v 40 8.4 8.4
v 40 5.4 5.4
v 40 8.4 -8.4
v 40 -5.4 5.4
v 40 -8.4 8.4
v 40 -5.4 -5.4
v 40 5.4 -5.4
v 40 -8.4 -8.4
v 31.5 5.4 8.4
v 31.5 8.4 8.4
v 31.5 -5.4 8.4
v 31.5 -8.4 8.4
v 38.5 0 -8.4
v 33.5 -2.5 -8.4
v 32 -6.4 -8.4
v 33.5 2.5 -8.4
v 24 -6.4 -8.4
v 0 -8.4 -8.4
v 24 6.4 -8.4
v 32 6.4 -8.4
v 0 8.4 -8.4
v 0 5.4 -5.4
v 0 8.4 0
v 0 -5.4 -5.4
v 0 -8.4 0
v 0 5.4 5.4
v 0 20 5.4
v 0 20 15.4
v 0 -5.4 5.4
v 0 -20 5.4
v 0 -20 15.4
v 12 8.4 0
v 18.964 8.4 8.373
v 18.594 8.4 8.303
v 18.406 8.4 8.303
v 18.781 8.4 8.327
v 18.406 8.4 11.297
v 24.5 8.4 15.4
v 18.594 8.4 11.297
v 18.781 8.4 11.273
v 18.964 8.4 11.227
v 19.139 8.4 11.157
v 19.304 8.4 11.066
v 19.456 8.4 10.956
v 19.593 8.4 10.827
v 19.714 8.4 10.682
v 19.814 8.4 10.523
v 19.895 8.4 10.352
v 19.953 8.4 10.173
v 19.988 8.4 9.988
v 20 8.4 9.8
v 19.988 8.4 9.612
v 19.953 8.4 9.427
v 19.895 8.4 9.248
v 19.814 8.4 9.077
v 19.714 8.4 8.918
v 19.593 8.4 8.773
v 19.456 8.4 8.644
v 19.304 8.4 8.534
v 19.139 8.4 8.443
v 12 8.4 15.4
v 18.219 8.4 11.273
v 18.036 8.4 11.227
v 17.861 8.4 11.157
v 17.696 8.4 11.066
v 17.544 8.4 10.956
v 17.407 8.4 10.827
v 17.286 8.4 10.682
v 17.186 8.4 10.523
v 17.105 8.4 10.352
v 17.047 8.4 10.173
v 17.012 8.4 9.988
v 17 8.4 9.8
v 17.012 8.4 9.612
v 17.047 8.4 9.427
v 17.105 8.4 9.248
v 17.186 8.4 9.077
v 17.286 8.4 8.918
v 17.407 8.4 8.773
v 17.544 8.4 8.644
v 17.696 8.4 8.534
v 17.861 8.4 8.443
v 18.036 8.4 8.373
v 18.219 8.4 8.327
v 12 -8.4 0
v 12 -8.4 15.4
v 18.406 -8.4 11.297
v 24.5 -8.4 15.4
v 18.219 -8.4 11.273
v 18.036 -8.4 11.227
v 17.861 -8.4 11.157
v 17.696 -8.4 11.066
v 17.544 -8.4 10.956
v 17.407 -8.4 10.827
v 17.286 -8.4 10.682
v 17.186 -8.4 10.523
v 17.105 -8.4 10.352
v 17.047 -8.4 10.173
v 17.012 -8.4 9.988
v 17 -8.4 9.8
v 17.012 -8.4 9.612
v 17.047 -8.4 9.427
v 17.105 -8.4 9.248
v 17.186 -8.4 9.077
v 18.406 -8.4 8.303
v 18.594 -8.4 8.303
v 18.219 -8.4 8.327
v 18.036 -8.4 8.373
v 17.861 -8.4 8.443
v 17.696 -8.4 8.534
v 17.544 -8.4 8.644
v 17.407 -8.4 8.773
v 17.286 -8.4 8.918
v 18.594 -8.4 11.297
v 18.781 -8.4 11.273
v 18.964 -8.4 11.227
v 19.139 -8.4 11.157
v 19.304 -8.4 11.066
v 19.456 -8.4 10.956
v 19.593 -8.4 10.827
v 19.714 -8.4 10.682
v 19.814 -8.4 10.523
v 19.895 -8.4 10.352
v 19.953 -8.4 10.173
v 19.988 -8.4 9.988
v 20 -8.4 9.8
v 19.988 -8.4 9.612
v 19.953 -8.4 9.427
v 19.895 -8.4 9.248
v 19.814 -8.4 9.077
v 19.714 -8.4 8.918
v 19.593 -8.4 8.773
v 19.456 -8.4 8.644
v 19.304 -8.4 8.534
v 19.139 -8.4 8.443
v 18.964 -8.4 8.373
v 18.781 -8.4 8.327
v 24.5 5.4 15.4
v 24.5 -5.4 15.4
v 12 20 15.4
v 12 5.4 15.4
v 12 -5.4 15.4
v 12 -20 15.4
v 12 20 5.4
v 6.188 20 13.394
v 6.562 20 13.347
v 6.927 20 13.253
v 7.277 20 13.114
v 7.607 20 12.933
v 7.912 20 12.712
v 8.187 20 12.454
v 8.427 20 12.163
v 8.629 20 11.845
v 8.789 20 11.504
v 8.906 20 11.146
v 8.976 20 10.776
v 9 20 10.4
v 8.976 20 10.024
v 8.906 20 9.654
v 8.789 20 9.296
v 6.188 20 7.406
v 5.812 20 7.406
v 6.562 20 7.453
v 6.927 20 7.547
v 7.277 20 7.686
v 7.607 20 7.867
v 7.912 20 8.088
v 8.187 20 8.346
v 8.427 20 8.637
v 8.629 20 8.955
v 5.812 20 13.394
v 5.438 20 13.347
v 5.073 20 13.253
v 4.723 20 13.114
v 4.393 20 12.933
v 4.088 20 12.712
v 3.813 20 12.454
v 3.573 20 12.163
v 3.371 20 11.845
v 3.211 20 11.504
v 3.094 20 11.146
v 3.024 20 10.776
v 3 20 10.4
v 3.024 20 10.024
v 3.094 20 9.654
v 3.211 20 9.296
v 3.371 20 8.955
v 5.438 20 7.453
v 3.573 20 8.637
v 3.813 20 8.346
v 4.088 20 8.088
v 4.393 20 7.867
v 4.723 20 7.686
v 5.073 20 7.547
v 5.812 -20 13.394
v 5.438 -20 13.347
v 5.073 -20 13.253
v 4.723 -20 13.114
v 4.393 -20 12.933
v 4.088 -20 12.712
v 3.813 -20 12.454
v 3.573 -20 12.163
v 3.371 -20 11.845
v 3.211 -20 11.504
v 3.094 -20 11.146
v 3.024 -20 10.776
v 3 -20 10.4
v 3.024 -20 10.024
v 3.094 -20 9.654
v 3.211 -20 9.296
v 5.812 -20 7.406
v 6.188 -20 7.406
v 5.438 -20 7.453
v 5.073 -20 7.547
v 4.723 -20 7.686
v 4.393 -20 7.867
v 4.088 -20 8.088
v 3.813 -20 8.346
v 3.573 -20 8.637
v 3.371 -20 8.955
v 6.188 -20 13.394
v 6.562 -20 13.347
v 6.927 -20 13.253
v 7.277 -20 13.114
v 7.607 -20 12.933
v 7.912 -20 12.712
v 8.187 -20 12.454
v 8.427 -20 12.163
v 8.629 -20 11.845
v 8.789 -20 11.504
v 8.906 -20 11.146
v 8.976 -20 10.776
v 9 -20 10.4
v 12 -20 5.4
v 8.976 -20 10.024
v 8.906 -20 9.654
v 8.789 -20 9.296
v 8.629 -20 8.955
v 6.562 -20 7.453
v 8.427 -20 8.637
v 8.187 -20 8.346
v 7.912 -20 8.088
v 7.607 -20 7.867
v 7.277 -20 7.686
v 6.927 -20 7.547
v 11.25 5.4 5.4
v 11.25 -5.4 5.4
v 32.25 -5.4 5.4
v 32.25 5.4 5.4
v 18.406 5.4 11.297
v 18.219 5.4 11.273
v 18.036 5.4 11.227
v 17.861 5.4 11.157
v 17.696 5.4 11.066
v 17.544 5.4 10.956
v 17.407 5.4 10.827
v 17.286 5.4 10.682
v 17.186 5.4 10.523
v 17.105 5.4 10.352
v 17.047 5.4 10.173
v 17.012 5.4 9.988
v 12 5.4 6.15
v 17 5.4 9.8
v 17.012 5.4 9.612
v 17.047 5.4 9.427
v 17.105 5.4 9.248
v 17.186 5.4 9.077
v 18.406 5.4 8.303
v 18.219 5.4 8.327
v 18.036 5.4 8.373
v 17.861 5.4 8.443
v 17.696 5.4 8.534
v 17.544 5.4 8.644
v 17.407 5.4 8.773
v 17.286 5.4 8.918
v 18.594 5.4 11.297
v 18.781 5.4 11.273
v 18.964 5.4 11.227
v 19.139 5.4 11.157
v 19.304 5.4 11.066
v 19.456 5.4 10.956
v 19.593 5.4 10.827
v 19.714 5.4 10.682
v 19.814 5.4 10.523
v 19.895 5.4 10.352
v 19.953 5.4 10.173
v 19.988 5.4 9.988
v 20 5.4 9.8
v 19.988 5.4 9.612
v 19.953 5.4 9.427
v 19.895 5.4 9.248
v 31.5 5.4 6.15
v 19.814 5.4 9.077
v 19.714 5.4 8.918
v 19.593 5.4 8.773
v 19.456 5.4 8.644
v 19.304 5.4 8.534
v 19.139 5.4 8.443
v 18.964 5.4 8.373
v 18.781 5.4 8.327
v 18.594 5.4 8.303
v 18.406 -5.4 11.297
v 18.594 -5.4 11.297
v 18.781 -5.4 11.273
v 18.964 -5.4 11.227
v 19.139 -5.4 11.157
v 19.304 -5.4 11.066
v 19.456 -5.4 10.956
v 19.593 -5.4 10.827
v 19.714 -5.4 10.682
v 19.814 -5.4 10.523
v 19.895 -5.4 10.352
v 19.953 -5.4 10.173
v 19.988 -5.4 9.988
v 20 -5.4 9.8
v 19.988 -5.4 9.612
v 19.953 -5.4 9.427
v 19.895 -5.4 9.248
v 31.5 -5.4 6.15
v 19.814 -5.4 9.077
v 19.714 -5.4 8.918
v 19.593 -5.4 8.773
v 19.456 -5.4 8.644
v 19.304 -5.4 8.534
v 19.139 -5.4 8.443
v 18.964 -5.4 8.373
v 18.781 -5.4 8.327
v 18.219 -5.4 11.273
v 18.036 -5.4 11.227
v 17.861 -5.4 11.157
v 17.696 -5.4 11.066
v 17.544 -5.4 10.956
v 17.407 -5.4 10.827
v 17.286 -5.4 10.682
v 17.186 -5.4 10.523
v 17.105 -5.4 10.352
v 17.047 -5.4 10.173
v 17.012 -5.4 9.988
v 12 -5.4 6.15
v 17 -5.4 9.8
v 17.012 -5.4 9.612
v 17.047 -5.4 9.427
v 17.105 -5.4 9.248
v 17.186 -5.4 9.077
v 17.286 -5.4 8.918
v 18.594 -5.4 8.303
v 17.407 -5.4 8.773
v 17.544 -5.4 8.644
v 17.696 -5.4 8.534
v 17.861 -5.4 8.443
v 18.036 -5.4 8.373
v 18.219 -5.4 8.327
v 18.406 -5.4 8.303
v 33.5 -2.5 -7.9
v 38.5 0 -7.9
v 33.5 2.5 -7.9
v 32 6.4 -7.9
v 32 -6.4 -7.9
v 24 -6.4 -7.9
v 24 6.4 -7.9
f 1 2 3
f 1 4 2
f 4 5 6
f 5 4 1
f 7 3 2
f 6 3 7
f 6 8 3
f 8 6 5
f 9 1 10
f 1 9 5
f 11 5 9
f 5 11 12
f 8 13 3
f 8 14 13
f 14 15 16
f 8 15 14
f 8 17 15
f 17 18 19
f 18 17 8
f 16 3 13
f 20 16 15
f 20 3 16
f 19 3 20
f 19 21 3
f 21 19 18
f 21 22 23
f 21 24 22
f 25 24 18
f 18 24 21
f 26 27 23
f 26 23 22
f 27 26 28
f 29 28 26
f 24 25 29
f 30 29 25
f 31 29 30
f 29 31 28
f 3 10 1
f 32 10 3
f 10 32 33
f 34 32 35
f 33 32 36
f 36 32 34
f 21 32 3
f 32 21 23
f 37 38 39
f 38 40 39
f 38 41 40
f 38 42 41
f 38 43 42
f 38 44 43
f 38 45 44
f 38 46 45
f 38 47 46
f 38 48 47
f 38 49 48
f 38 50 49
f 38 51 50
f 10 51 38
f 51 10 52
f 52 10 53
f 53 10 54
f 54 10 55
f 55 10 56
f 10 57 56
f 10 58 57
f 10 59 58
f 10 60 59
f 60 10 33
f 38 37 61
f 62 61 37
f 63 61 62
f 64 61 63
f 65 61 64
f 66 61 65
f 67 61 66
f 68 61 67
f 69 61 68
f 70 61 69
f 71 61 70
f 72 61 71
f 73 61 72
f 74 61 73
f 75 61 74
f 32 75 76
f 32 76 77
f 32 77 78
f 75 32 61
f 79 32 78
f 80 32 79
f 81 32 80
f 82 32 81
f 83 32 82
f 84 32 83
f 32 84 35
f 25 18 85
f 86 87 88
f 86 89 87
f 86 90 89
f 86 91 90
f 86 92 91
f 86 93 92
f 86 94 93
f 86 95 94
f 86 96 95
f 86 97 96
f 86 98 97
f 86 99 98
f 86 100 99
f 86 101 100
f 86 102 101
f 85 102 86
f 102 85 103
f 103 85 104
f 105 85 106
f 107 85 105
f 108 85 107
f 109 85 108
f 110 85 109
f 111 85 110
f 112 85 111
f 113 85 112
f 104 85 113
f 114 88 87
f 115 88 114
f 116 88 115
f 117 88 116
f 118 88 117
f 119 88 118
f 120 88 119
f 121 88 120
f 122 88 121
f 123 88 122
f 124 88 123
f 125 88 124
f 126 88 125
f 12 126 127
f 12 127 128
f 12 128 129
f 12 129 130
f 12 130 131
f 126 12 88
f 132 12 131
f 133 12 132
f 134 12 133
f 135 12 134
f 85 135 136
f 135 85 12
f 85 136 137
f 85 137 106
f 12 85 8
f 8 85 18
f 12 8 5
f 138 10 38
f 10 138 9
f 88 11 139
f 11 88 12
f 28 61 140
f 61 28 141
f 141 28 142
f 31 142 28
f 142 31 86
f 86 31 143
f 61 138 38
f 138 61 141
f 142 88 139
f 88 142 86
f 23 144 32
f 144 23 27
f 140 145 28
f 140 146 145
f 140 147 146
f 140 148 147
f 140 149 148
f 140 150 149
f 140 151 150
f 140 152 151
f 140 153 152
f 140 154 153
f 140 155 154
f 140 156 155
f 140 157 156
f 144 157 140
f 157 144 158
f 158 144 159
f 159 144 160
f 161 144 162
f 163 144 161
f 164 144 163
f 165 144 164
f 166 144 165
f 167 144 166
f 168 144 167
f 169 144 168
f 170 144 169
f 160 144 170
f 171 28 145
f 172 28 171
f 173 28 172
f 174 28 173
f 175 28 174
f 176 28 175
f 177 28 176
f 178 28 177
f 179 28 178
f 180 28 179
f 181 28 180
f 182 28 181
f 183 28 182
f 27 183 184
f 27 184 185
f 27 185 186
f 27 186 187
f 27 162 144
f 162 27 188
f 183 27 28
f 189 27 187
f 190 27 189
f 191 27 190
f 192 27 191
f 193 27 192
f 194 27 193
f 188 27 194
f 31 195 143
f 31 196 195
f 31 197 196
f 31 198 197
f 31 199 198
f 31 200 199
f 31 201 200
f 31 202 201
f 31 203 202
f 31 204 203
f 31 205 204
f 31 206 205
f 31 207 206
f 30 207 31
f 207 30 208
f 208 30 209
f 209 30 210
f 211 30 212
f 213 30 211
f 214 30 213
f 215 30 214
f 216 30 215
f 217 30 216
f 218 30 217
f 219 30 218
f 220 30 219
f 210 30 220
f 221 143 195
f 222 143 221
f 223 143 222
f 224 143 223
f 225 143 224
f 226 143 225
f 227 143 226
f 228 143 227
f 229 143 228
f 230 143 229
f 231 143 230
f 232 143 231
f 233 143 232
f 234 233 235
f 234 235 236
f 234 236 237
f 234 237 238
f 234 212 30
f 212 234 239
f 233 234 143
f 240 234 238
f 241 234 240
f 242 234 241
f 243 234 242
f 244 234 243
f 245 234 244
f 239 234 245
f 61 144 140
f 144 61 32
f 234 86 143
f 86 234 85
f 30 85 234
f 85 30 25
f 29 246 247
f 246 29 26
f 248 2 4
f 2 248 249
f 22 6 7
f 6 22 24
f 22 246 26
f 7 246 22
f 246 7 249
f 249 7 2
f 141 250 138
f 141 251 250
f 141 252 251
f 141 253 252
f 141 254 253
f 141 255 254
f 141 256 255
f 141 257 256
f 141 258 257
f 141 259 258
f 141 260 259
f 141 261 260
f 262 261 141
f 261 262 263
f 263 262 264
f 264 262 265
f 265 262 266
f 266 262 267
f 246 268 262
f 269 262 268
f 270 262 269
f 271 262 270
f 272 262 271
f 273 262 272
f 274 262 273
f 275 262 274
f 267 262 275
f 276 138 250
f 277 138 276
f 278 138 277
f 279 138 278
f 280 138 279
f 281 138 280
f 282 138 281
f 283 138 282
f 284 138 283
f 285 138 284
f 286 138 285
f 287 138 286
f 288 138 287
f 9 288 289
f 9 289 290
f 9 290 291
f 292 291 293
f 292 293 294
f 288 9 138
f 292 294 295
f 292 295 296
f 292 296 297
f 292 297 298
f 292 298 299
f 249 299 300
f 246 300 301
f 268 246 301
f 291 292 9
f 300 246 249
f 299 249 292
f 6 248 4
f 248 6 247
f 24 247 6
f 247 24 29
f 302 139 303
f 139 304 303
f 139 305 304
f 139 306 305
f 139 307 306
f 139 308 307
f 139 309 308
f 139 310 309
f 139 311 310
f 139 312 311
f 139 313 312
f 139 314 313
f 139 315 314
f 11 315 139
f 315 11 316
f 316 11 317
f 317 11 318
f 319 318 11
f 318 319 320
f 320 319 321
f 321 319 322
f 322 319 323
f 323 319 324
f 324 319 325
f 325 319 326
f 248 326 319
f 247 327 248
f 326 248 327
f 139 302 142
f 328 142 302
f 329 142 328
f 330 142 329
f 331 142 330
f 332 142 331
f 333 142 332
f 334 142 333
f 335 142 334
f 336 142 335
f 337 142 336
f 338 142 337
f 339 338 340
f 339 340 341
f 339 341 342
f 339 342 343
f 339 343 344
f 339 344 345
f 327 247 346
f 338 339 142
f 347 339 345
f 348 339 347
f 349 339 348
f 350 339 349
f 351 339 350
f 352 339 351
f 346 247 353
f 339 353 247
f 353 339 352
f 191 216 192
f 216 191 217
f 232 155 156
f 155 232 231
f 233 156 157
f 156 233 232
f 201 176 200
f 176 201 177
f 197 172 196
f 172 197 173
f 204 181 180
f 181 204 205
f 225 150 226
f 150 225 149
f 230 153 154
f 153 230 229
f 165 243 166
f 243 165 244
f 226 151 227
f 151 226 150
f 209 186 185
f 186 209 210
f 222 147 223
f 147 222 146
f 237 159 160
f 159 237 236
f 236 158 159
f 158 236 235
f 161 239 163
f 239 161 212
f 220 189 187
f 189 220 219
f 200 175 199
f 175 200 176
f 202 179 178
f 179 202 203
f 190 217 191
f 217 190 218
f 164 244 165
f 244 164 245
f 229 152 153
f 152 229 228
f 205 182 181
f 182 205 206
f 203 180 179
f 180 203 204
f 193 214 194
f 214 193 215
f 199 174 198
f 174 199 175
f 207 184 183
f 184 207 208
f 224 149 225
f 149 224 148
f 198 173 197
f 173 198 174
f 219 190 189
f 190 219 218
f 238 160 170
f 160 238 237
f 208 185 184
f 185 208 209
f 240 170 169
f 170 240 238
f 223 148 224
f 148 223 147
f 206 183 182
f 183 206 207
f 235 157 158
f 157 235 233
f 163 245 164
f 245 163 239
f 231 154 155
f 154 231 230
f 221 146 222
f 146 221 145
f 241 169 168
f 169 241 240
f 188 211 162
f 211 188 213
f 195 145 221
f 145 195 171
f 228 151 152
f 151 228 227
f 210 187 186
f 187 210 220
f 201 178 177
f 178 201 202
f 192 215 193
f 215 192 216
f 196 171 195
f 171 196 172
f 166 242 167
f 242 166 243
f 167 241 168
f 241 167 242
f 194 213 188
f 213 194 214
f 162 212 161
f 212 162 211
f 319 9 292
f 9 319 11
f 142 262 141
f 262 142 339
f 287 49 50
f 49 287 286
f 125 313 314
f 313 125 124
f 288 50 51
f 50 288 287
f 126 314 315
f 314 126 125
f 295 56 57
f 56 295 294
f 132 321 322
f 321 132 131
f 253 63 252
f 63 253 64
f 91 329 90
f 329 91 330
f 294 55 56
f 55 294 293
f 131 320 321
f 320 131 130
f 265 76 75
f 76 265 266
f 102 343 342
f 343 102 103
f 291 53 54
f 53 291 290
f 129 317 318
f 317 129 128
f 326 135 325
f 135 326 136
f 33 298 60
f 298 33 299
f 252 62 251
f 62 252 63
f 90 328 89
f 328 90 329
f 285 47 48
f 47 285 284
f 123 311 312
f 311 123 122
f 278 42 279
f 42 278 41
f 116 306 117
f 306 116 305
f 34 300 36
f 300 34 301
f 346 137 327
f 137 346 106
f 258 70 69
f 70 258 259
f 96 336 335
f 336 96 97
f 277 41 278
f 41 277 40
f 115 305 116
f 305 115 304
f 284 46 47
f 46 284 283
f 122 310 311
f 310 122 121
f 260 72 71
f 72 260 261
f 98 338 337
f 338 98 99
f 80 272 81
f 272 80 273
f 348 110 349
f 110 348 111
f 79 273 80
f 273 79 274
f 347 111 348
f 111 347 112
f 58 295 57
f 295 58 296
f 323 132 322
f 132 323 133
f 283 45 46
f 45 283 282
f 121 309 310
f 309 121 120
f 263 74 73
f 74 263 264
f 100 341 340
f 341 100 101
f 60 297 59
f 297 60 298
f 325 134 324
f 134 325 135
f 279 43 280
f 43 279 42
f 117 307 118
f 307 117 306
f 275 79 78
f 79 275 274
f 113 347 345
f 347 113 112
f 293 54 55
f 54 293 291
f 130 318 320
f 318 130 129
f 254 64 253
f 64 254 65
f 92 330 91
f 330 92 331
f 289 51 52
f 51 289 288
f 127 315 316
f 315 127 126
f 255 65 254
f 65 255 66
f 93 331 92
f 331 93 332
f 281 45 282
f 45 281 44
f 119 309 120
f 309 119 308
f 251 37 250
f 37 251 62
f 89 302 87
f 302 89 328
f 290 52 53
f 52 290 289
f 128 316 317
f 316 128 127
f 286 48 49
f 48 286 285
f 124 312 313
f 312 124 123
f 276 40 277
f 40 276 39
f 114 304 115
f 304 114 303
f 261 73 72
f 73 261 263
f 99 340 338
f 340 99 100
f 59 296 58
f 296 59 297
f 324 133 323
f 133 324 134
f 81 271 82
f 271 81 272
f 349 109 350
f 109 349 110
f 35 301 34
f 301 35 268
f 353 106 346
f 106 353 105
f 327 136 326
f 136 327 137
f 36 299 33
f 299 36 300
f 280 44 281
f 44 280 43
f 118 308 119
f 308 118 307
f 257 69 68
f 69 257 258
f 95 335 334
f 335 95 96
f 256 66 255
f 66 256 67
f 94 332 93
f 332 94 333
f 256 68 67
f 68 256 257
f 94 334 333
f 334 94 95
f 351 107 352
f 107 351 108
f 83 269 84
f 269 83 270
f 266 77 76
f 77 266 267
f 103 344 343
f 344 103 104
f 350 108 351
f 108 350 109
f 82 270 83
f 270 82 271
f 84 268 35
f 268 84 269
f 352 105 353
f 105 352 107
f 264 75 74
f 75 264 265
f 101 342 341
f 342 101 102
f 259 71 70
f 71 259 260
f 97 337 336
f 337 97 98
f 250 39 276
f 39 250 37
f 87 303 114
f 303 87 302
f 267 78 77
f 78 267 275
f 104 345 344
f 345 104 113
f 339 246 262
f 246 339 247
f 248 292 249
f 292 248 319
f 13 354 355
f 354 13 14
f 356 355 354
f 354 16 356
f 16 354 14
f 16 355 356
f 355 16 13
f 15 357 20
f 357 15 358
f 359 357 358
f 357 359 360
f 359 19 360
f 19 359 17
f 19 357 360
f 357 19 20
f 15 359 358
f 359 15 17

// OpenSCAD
// file: antenna_parts.scad
/*
 *  This file is part of the portable pluggable YAGI Design.
 *
 *  This documentation describes Open Hardware and is licensed under the
 *  CERN OHL either version 1.2 of the license, or (at your option) any
 *  later version.
 *
 *  You may redistribute and modify this documentation under the terms of
 *  the CERN OHL v.1.2 (http://ohwr.org/cernohl). This documentation is
 *  distributed WITHOUT ANY EXPRESS OR IMPLIED WARRANTY, INCLUDING OF
 *  MERCHANTABILITY, SATISFACTORY QUALITY AND FITNESS FOR A PARTICULAR PURPOSE.
 *  Please see the CERN OHL v.1.2 for applicable conditions.
 *
 *  Copyright (c) 2016 Thomas Pointhuber
 */

module rod_profile(width=10, inner_width=8, length=100) {
    // Rod Profile dummy
    color("LightGrey") {
        translate([0, 0, 0]) {
            difference() {
                cube([length
                     ,width
                     ,width]
                    ,center=true);
                cube([length+2
                     ,inner_width
                     ,inner_width]
                    ,center=true);
            }
        }
    }
}
 
module director(diameter=6, length=350) {
    // Radiator dummy
    $fn = 50;
    color("LightGrey") {
        translate([0, length/2, 0]) {
        rotate([90,0,0])
            cylinder(r=diameter/2, h=length);
        }
    }
}

// connector
module connector() {
    $fn = 50;
    color("LightGrey") {
        translate([-module_axis_pos+radiator_1_length_offset-radiator_module_offset,0,20]) {
            difference() {
                union() {
                    translate([4,0,0]) {
                        rotate([0,-90,0])
                                cylinder(r=16/2
                                        ,h=22);
                    }
                    translate([-2,-25.5/2,-25.5/2]) {
                        cube([2
                             ,25.5
                             ,25.5]);
                    }
                }
                translate([1,18.4/2,18.4/2]) {
                    rotate([0,-90,0])
                        cylinder(r=3/2
                                ,h=4);
                }
                translate([1,18.4/2,-18.4/2]) {
                    rotate([0,-90,0])
                        cylinder(r=3/2
                                ,h=4);
                }
                translate([1,-18.4/2,18.4/2]) {
                    rotate([0,-90,0])
                        cylinder(r=3/2
                                ,h=4);
                }
                translate([1,-18.4/2,-18.4/2]) {
                    rotate([0,-90,0])
                        cylinder(r=3/2
                                ,h=4);
                }
            }
        }
    }
}
connector();
//rod_profile(width=10, inner_width=8, length=1000);
//director(diameter=6, length=350);
// main file
/*
 *  This file is part of the portable pluggable YAGI Design.
 *
 *  This documentation describes Open Hardware and is licensed under the
 *  CERN OHL either version 1.2 of the license, or (at your option) any
 *  later version.
 *
 *  You may redistribute and modify this documentation under the terms of
 *  the CERN OHL v.1.2 (http://ohwr.org/cernohl). This documentation is
 *  distributed WITHOUT ANY EXPRESS OR IMPLIED WARRANTY, INCLUDING OF
 *  MERCHANTABILITY, SATISFACTORY QUALITY AND FITNESS FOR A PARTICULAR PURPOSE.
 *  Please see the CERN OHL v.1.2 for applicable conditions.
 *
 *  Copyright (c) 2016 Thomas Pointhuber
 */

use <antenna_parts.scad>;

module director_module(rod_width=10,                // width of rod
                       rod_clearance=0.8,           // has to be adjust to the printer tolerance
                       module_length=40,
                       shell=3,
                       director_diameter=6,         // diameter of director
                       director_module_width=40,
                       director_x=6,
                       director_y=5,
                       director_y_shell=2,
                       clamp_x=18.5,
                       clamp_overlap=0.2,           // clamp overlap to rod
                       clamp_asymetic=0.5,
                       clamp_diameter=9,
                       clamp_hole=3) {

    module_outer_width = rod_width + rod_clearance + shell*2;
    module_inner_width = rod_width + rod_clearance;
                           
    module_y_bottom_start = module_inner_width/2;

    director_box_length = clamp_x+clamp_diameter/2+clamp_asymetic+1; // TODO
    director_box_height = director_y-shell + director_diameter/2 + director_y_shell;

    director_module_length = director_x*2;

    $fn = 50;

    difference() {
        union() {
            // main body
            translate([0, -module_outer_width/2, -module_outer_width/2])
                    cube([module_length, module_outer_width, module_outer_width], center=false);

            hull() {
                translate([0, -module_outer_width/2, -module_outer_width/2])
                    cube([director_box_length+director_box_height, module_outer_width, module_outer_width], center=false);
                
                // director box
                translate([0, -module_outer_width/2, module_y_bottom_start+shell])
                    cube([director_box_length,
                          module_outer_width,
                          director_box_height]);
            }
            hull() {
                
                translate([0,
                           module_outer_width/2,
                           module_y_bottom_start + director_y - director_diameter/2 - director_y_shell])
                    cube([director_module_length, // TODO
                          (director_module_width-module_outer_width)/2,
                          director_diameter + director_y_shell*2]);
                translate([0,
                           -module_outer_width/2-(director_module_width-module_outer_width)/2,
                           module_y_bottom_start + director_y - director_diameter/2 - director_y_shell])
                    cube([director_module_length, // TODO
                          (director_module_width-module_outer_width)/2,
                          director_diameter + director_y_shell*2]);
                
                // outer part of hull
                translate([0, -module_outer_width/2, 0])
                    cube([director_module_length, // TODO
                          module_outer_width,
                          1]);
            }
        }
        
        // rod
        translate([module_length/2, 0, 0])
            cube([module_length + 2, module_inner_width, module_inner_width], center=true);
        
        // director
        translate([director_x, 0, module_y_bottom_start+director_y])
            director(diameter=director_diameter, length=350);
        
        // clamp cutout
        translate([clamp_x-clamp_diameter/2-clamp_asymetic*2-1,
                   -module_inner_width/2,
                   module_y_bottom_start-1])
            cube([director_box_length+director_box_height-(clamp_x-clamp_diameter/2-clamp_asymetic*2-1),
                  module_inner_width,
                  director_y-shell + director_diameter + director_y_shell+2], center=false);

        // clamp hole
        translate([clamp_x,
                   module_outer_width/2+1,
                   rod_width/2 + clamp_diameter/2 + clamp_asymetic - clamp_overlap])
            rotate([90, 0, 0])
                cylinder(r=clamp_hole/2, module_outer_width+2);
        
        // bevel
        translate([clamp_x-clamp_diameter/2-clamp_asymetic*2-1+1, 0, module_inner_width/2-1.5])
            hull() {
                cube([6, module_inner_width, 0.5], center=true);
                cube([0.5, module_inner_width, 6], center=true);
            }
        translate([clamp_x-clamp_diameter/2-clamp_asymetic*2-2+director_box_length+director_box_height-(clamp_x-clamp_diameter/2-clamp_asymetic*2-1), 0, module_inner_width/2-1.5])
            hull() {
                cube([6, module_inner_width, 0.5], center=true);
                cube([0.5, module_inner_width, 6], center=true);
            }

        // arrow
        translate([module_length-1.5-5, 0,-module_outer_width/2-1])
            linear_extrude(height = 1.5)
                polygon(points=[[5,0],[0,2.5],[0,-2.5]]);
        
        // lettering field
        translate([module_length-16,-(module_outer_width-4)/2,-module_outer_width/2-1])
            cube([8, module_outer_width-4, 1.5]);
    }
}

director_module();
